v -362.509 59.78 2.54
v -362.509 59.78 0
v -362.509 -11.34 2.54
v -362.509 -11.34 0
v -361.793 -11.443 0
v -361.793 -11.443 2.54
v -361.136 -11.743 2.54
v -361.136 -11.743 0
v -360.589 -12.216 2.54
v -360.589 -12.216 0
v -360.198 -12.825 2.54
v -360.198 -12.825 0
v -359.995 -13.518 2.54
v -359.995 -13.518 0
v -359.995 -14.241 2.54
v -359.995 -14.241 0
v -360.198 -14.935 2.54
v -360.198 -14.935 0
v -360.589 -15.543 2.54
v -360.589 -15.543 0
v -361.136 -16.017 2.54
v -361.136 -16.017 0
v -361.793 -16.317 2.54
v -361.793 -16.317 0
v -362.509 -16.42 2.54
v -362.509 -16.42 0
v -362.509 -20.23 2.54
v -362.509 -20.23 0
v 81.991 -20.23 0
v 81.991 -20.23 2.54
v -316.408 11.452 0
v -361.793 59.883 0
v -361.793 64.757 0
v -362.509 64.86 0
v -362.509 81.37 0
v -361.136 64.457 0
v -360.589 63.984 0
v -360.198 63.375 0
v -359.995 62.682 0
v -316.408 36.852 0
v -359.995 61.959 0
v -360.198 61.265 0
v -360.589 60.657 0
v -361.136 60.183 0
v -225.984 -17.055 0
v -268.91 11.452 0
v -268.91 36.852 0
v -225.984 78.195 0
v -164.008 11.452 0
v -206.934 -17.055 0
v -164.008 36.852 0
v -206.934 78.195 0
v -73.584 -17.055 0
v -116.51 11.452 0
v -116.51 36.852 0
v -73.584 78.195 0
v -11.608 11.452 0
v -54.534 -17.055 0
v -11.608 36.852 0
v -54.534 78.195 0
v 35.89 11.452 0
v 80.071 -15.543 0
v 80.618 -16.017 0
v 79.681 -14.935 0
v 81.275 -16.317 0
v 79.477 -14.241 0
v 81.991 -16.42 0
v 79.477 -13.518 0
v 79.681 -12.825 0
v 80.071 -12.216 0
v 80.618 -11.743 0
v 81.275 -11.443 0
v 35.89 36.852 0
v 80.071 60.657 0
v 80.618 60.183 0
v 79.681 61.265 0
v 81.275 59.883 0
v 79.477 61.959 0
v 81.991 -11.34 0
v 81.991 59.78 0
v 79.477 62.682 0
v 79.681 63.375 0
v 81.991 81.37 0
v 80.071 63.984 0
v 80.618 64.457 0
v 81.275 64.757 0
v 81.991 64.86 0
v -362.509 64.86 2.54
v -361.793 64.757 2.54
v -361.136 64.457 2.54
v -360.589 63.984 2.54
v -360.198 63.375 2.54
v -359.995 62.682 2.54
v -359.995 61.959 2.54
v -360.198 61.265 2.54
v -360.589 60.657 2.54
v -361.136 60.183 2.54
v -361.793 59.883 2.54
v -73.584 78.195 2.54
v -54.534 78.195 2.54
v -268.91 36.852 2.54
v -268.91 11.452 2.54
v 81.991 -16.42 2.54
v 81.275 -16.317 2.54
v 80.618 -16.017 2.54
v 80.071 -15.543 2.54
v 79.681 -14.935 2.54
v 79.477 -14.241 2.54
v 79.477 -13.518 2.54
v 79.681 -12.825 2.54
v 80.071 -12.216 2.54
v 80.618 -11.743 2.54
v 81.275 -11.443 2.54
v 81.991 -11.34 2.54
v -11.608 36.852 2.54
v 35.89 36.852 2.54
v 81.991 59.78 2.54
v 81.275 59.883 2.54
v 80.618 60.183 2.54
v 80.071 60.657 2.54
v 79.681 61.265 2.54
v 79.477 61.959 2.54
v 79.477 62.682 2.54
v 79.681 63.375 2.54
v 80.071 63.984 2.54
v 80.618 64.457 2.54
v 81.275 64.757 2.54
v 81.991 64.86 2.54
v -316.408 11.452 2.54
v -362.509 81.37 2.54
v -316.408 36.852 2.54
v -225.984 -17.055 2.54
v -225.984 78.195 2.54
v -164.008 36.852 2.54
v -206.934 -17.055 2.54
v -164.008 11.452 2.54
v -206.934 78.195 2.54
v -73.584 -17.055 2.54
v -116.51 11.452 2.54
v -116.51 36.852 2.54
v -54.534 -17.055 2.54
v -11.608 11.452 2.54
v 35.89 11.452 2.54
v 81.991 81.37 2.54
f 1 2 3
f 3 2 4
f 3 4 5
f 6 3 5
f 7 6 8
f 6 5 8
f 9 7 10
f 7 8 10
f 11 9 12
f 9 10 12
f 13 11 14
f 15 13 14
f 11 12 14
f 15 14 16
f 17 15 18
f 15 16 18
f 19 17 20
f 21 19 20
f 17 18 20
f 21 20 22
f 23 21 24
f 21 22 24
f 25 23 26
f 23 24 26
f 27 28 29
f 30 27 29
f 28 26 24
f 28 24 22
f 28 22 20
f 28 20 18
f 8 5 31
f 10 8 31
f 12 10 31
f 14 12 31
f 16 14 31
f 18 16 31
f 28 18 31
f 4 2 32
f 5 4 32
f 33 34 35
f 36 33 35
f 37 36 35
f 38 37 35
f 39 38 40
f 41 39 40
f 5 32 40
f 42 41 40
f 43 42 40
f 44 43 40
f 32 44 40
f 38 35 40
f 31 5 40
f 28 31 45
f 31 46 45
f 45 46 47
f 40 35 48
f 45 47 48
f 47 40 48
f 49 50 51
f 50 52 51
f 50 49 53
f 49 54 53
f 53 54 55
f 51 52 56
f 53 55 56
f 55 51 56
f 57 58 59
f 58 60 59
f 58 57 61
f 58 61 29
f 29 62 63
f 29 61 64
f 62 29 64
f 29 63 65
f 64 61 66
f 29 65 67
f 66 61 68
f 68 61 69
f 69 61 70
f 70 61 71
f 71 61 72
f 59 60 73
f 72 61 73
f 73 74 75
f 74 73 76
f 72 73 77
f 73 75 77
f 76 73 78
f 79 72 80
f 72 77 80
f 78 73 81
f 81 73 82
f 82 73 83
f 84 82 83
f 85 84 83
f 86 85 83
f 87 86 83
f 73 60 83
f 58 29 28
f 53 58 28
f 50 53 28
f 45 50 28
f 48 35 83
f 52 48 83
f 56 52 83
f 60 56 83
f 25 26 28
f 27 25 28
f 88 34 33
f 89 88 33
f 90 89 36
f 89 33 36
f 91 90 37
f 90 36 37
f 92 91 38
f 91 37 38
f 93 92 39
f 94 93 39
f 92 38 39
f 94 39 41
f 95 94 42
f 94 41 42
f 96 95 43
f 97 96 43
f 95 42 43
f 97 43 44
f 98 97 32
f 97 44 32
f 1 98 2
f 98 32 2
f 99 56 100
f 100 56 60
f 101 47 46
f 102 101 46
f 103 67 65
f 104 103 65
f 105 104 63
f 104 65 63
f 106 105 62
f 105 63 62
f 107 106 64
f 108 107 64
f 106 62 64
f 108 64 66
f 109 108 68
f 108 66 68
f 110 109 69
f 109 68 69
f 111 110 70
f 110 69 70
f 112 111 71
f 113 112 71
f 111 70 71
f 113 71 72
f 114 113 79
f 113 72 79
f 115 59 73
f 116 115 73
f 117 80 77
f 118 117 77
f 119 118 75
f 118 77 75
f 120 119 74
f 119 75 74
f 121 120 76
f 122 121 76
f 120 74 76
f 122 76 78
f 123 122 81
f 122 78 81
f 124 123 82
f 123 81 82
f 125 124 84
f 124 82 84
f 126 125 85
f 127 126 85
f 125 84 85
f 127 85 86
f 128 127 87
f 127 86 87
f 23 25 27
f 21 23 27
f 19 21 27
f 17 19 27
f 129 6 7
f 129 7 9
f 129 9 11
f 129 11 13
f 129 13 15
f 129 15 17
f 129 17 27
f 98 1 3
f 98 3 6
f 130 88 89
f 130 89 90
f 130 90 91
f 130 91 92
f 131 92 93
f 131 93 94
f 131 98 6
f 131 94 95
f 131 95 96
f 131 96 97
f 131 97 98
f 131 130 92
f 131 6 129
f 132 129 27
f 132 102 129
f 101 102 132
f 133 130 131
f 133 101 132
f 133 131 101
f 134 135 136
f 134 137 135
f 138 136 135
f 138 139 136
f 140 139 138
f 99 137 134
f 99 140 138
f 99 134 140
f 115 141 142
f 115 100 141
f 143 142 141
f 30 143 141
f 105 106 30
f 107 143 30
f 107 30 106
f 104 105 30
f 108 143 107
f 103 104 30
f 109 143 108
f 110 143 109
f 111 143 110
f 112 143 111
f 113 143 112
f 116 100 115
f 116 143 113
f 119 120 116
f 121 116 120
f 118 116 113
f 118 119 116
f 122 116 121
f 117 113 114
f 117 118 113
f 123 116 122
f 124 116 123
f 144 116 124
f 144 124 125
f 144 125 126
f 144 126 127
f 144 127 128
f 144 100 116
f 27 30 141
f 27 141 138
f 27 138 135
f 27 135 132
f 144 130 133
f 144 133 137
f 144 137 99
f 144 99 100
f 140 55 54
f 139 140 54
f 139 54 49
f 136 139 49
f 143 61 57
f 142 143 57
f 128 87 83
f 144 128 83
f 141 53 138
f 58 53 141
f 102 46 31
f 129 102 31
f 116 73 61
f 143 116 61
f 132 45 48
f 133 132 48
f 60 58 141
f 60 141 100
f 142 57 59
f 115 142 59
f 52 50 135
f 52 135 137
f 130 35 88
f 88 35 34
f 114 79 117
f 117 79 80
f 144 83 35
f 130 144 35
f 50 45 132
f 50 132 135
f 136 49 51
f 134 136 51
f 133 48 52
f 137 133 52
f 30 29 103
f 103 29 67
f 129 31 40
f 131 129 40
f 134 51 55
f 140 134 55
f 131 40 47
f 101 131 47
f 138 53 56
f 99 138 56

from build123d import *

# Parameters (mm, degrees)
SKETCH1_W           = 19.05
SKETCH1_H           = 95.25
BOSS_EXTRUDE2_DEPTH = 2.54


with BuildPart() as part:
    # Sketch1 → Boss-Extrude2 (new body)
    with BuildSketch(Plane.XY):
        with BuildLine():
            Line((-362.508916396, 81.370262461), (-362.508916396, 64.860262461))
            ThreePointArc((-362.508916396, 64.860262461), (-359.968916396, 62.320262461), (-362.508916396, 59.780262461))
            Line((-362.508916396, 59.780262461), (-362.508916396, -11.339737539))
            ThreePointArc((-362.508916396, -11.339737539), (-359.968916396, -13.879737539), (-362.508916396, -16.419737539))
            Line((-362.508916396, -16.419737539), (-362.508916396, -20.229737539))
            Line((-362.508916396, -20.229737539), (81.991083604, -20.229737539))
            Line((81.991083604, -20.229737539), (81.991083604, -16.419737539))
            ThreePointArc((81.991083604, -16.419737539), (79.451083604, -13.879737539), (81.991083604, -11.339737539))
            Line((81.991083604, -11.339737539), (81.991083604, 59.780262461))
            ThreePointArc((81.991083604, 59.780262461), (79.451083604, 62.320262461), (81.991083604, 64.860262461))
            Line((81.991083604, 64.860262461), (81.991083604, 81.370262461))
            Line((81.991083604, 81.370262461), (-362.508916396, 81.370262461))
        make_face()
        with Locations((-64.058916396, 30.570262461)):
            Rectangle(SKETCH1_W, SKETCH1_H, mode=Mode.SUBTRACT)
        Polygon((-316.407916396, 11.451682461), (-316.407916396, 36.851682461), (-292.658916396, 36.851682461), (-268.909916396, 36.851682461), (-268.909916396, 11.451682461), (-292.658916396, 11.451682461), align=None, mode=Mode.SUBTRACT)
        Polygon((-164.007916396, 11.451682461), (-164.007916396, 36.851682461), (-140.258916396, 36.851682461), (-116.509916396, 36.851682461), (-116.509916396, 11.451682461), (-140.258916396, 11.451682461), align=None, mode=Mode.SUBTRACT)
        with Locations((-216.458916396, 30.570262461)):
            Rectangle(SKETCH1_W, SKETCH1_H, mode=Mode.SUBTRACT)
        Polygon((-11.607916396, 11.451682461), (-11.607916396, 36.851682461), (12.141083604, 36.851682461), (35.890083604, 36.851682461), (35.890083604, 11.451682461), (12.141083604, 11.451682461), align=None, mode=Mode.SUBTRACT)
    extrude(amount=BOSS_EXTRUDE2_DEPTH)


solid = part.part
